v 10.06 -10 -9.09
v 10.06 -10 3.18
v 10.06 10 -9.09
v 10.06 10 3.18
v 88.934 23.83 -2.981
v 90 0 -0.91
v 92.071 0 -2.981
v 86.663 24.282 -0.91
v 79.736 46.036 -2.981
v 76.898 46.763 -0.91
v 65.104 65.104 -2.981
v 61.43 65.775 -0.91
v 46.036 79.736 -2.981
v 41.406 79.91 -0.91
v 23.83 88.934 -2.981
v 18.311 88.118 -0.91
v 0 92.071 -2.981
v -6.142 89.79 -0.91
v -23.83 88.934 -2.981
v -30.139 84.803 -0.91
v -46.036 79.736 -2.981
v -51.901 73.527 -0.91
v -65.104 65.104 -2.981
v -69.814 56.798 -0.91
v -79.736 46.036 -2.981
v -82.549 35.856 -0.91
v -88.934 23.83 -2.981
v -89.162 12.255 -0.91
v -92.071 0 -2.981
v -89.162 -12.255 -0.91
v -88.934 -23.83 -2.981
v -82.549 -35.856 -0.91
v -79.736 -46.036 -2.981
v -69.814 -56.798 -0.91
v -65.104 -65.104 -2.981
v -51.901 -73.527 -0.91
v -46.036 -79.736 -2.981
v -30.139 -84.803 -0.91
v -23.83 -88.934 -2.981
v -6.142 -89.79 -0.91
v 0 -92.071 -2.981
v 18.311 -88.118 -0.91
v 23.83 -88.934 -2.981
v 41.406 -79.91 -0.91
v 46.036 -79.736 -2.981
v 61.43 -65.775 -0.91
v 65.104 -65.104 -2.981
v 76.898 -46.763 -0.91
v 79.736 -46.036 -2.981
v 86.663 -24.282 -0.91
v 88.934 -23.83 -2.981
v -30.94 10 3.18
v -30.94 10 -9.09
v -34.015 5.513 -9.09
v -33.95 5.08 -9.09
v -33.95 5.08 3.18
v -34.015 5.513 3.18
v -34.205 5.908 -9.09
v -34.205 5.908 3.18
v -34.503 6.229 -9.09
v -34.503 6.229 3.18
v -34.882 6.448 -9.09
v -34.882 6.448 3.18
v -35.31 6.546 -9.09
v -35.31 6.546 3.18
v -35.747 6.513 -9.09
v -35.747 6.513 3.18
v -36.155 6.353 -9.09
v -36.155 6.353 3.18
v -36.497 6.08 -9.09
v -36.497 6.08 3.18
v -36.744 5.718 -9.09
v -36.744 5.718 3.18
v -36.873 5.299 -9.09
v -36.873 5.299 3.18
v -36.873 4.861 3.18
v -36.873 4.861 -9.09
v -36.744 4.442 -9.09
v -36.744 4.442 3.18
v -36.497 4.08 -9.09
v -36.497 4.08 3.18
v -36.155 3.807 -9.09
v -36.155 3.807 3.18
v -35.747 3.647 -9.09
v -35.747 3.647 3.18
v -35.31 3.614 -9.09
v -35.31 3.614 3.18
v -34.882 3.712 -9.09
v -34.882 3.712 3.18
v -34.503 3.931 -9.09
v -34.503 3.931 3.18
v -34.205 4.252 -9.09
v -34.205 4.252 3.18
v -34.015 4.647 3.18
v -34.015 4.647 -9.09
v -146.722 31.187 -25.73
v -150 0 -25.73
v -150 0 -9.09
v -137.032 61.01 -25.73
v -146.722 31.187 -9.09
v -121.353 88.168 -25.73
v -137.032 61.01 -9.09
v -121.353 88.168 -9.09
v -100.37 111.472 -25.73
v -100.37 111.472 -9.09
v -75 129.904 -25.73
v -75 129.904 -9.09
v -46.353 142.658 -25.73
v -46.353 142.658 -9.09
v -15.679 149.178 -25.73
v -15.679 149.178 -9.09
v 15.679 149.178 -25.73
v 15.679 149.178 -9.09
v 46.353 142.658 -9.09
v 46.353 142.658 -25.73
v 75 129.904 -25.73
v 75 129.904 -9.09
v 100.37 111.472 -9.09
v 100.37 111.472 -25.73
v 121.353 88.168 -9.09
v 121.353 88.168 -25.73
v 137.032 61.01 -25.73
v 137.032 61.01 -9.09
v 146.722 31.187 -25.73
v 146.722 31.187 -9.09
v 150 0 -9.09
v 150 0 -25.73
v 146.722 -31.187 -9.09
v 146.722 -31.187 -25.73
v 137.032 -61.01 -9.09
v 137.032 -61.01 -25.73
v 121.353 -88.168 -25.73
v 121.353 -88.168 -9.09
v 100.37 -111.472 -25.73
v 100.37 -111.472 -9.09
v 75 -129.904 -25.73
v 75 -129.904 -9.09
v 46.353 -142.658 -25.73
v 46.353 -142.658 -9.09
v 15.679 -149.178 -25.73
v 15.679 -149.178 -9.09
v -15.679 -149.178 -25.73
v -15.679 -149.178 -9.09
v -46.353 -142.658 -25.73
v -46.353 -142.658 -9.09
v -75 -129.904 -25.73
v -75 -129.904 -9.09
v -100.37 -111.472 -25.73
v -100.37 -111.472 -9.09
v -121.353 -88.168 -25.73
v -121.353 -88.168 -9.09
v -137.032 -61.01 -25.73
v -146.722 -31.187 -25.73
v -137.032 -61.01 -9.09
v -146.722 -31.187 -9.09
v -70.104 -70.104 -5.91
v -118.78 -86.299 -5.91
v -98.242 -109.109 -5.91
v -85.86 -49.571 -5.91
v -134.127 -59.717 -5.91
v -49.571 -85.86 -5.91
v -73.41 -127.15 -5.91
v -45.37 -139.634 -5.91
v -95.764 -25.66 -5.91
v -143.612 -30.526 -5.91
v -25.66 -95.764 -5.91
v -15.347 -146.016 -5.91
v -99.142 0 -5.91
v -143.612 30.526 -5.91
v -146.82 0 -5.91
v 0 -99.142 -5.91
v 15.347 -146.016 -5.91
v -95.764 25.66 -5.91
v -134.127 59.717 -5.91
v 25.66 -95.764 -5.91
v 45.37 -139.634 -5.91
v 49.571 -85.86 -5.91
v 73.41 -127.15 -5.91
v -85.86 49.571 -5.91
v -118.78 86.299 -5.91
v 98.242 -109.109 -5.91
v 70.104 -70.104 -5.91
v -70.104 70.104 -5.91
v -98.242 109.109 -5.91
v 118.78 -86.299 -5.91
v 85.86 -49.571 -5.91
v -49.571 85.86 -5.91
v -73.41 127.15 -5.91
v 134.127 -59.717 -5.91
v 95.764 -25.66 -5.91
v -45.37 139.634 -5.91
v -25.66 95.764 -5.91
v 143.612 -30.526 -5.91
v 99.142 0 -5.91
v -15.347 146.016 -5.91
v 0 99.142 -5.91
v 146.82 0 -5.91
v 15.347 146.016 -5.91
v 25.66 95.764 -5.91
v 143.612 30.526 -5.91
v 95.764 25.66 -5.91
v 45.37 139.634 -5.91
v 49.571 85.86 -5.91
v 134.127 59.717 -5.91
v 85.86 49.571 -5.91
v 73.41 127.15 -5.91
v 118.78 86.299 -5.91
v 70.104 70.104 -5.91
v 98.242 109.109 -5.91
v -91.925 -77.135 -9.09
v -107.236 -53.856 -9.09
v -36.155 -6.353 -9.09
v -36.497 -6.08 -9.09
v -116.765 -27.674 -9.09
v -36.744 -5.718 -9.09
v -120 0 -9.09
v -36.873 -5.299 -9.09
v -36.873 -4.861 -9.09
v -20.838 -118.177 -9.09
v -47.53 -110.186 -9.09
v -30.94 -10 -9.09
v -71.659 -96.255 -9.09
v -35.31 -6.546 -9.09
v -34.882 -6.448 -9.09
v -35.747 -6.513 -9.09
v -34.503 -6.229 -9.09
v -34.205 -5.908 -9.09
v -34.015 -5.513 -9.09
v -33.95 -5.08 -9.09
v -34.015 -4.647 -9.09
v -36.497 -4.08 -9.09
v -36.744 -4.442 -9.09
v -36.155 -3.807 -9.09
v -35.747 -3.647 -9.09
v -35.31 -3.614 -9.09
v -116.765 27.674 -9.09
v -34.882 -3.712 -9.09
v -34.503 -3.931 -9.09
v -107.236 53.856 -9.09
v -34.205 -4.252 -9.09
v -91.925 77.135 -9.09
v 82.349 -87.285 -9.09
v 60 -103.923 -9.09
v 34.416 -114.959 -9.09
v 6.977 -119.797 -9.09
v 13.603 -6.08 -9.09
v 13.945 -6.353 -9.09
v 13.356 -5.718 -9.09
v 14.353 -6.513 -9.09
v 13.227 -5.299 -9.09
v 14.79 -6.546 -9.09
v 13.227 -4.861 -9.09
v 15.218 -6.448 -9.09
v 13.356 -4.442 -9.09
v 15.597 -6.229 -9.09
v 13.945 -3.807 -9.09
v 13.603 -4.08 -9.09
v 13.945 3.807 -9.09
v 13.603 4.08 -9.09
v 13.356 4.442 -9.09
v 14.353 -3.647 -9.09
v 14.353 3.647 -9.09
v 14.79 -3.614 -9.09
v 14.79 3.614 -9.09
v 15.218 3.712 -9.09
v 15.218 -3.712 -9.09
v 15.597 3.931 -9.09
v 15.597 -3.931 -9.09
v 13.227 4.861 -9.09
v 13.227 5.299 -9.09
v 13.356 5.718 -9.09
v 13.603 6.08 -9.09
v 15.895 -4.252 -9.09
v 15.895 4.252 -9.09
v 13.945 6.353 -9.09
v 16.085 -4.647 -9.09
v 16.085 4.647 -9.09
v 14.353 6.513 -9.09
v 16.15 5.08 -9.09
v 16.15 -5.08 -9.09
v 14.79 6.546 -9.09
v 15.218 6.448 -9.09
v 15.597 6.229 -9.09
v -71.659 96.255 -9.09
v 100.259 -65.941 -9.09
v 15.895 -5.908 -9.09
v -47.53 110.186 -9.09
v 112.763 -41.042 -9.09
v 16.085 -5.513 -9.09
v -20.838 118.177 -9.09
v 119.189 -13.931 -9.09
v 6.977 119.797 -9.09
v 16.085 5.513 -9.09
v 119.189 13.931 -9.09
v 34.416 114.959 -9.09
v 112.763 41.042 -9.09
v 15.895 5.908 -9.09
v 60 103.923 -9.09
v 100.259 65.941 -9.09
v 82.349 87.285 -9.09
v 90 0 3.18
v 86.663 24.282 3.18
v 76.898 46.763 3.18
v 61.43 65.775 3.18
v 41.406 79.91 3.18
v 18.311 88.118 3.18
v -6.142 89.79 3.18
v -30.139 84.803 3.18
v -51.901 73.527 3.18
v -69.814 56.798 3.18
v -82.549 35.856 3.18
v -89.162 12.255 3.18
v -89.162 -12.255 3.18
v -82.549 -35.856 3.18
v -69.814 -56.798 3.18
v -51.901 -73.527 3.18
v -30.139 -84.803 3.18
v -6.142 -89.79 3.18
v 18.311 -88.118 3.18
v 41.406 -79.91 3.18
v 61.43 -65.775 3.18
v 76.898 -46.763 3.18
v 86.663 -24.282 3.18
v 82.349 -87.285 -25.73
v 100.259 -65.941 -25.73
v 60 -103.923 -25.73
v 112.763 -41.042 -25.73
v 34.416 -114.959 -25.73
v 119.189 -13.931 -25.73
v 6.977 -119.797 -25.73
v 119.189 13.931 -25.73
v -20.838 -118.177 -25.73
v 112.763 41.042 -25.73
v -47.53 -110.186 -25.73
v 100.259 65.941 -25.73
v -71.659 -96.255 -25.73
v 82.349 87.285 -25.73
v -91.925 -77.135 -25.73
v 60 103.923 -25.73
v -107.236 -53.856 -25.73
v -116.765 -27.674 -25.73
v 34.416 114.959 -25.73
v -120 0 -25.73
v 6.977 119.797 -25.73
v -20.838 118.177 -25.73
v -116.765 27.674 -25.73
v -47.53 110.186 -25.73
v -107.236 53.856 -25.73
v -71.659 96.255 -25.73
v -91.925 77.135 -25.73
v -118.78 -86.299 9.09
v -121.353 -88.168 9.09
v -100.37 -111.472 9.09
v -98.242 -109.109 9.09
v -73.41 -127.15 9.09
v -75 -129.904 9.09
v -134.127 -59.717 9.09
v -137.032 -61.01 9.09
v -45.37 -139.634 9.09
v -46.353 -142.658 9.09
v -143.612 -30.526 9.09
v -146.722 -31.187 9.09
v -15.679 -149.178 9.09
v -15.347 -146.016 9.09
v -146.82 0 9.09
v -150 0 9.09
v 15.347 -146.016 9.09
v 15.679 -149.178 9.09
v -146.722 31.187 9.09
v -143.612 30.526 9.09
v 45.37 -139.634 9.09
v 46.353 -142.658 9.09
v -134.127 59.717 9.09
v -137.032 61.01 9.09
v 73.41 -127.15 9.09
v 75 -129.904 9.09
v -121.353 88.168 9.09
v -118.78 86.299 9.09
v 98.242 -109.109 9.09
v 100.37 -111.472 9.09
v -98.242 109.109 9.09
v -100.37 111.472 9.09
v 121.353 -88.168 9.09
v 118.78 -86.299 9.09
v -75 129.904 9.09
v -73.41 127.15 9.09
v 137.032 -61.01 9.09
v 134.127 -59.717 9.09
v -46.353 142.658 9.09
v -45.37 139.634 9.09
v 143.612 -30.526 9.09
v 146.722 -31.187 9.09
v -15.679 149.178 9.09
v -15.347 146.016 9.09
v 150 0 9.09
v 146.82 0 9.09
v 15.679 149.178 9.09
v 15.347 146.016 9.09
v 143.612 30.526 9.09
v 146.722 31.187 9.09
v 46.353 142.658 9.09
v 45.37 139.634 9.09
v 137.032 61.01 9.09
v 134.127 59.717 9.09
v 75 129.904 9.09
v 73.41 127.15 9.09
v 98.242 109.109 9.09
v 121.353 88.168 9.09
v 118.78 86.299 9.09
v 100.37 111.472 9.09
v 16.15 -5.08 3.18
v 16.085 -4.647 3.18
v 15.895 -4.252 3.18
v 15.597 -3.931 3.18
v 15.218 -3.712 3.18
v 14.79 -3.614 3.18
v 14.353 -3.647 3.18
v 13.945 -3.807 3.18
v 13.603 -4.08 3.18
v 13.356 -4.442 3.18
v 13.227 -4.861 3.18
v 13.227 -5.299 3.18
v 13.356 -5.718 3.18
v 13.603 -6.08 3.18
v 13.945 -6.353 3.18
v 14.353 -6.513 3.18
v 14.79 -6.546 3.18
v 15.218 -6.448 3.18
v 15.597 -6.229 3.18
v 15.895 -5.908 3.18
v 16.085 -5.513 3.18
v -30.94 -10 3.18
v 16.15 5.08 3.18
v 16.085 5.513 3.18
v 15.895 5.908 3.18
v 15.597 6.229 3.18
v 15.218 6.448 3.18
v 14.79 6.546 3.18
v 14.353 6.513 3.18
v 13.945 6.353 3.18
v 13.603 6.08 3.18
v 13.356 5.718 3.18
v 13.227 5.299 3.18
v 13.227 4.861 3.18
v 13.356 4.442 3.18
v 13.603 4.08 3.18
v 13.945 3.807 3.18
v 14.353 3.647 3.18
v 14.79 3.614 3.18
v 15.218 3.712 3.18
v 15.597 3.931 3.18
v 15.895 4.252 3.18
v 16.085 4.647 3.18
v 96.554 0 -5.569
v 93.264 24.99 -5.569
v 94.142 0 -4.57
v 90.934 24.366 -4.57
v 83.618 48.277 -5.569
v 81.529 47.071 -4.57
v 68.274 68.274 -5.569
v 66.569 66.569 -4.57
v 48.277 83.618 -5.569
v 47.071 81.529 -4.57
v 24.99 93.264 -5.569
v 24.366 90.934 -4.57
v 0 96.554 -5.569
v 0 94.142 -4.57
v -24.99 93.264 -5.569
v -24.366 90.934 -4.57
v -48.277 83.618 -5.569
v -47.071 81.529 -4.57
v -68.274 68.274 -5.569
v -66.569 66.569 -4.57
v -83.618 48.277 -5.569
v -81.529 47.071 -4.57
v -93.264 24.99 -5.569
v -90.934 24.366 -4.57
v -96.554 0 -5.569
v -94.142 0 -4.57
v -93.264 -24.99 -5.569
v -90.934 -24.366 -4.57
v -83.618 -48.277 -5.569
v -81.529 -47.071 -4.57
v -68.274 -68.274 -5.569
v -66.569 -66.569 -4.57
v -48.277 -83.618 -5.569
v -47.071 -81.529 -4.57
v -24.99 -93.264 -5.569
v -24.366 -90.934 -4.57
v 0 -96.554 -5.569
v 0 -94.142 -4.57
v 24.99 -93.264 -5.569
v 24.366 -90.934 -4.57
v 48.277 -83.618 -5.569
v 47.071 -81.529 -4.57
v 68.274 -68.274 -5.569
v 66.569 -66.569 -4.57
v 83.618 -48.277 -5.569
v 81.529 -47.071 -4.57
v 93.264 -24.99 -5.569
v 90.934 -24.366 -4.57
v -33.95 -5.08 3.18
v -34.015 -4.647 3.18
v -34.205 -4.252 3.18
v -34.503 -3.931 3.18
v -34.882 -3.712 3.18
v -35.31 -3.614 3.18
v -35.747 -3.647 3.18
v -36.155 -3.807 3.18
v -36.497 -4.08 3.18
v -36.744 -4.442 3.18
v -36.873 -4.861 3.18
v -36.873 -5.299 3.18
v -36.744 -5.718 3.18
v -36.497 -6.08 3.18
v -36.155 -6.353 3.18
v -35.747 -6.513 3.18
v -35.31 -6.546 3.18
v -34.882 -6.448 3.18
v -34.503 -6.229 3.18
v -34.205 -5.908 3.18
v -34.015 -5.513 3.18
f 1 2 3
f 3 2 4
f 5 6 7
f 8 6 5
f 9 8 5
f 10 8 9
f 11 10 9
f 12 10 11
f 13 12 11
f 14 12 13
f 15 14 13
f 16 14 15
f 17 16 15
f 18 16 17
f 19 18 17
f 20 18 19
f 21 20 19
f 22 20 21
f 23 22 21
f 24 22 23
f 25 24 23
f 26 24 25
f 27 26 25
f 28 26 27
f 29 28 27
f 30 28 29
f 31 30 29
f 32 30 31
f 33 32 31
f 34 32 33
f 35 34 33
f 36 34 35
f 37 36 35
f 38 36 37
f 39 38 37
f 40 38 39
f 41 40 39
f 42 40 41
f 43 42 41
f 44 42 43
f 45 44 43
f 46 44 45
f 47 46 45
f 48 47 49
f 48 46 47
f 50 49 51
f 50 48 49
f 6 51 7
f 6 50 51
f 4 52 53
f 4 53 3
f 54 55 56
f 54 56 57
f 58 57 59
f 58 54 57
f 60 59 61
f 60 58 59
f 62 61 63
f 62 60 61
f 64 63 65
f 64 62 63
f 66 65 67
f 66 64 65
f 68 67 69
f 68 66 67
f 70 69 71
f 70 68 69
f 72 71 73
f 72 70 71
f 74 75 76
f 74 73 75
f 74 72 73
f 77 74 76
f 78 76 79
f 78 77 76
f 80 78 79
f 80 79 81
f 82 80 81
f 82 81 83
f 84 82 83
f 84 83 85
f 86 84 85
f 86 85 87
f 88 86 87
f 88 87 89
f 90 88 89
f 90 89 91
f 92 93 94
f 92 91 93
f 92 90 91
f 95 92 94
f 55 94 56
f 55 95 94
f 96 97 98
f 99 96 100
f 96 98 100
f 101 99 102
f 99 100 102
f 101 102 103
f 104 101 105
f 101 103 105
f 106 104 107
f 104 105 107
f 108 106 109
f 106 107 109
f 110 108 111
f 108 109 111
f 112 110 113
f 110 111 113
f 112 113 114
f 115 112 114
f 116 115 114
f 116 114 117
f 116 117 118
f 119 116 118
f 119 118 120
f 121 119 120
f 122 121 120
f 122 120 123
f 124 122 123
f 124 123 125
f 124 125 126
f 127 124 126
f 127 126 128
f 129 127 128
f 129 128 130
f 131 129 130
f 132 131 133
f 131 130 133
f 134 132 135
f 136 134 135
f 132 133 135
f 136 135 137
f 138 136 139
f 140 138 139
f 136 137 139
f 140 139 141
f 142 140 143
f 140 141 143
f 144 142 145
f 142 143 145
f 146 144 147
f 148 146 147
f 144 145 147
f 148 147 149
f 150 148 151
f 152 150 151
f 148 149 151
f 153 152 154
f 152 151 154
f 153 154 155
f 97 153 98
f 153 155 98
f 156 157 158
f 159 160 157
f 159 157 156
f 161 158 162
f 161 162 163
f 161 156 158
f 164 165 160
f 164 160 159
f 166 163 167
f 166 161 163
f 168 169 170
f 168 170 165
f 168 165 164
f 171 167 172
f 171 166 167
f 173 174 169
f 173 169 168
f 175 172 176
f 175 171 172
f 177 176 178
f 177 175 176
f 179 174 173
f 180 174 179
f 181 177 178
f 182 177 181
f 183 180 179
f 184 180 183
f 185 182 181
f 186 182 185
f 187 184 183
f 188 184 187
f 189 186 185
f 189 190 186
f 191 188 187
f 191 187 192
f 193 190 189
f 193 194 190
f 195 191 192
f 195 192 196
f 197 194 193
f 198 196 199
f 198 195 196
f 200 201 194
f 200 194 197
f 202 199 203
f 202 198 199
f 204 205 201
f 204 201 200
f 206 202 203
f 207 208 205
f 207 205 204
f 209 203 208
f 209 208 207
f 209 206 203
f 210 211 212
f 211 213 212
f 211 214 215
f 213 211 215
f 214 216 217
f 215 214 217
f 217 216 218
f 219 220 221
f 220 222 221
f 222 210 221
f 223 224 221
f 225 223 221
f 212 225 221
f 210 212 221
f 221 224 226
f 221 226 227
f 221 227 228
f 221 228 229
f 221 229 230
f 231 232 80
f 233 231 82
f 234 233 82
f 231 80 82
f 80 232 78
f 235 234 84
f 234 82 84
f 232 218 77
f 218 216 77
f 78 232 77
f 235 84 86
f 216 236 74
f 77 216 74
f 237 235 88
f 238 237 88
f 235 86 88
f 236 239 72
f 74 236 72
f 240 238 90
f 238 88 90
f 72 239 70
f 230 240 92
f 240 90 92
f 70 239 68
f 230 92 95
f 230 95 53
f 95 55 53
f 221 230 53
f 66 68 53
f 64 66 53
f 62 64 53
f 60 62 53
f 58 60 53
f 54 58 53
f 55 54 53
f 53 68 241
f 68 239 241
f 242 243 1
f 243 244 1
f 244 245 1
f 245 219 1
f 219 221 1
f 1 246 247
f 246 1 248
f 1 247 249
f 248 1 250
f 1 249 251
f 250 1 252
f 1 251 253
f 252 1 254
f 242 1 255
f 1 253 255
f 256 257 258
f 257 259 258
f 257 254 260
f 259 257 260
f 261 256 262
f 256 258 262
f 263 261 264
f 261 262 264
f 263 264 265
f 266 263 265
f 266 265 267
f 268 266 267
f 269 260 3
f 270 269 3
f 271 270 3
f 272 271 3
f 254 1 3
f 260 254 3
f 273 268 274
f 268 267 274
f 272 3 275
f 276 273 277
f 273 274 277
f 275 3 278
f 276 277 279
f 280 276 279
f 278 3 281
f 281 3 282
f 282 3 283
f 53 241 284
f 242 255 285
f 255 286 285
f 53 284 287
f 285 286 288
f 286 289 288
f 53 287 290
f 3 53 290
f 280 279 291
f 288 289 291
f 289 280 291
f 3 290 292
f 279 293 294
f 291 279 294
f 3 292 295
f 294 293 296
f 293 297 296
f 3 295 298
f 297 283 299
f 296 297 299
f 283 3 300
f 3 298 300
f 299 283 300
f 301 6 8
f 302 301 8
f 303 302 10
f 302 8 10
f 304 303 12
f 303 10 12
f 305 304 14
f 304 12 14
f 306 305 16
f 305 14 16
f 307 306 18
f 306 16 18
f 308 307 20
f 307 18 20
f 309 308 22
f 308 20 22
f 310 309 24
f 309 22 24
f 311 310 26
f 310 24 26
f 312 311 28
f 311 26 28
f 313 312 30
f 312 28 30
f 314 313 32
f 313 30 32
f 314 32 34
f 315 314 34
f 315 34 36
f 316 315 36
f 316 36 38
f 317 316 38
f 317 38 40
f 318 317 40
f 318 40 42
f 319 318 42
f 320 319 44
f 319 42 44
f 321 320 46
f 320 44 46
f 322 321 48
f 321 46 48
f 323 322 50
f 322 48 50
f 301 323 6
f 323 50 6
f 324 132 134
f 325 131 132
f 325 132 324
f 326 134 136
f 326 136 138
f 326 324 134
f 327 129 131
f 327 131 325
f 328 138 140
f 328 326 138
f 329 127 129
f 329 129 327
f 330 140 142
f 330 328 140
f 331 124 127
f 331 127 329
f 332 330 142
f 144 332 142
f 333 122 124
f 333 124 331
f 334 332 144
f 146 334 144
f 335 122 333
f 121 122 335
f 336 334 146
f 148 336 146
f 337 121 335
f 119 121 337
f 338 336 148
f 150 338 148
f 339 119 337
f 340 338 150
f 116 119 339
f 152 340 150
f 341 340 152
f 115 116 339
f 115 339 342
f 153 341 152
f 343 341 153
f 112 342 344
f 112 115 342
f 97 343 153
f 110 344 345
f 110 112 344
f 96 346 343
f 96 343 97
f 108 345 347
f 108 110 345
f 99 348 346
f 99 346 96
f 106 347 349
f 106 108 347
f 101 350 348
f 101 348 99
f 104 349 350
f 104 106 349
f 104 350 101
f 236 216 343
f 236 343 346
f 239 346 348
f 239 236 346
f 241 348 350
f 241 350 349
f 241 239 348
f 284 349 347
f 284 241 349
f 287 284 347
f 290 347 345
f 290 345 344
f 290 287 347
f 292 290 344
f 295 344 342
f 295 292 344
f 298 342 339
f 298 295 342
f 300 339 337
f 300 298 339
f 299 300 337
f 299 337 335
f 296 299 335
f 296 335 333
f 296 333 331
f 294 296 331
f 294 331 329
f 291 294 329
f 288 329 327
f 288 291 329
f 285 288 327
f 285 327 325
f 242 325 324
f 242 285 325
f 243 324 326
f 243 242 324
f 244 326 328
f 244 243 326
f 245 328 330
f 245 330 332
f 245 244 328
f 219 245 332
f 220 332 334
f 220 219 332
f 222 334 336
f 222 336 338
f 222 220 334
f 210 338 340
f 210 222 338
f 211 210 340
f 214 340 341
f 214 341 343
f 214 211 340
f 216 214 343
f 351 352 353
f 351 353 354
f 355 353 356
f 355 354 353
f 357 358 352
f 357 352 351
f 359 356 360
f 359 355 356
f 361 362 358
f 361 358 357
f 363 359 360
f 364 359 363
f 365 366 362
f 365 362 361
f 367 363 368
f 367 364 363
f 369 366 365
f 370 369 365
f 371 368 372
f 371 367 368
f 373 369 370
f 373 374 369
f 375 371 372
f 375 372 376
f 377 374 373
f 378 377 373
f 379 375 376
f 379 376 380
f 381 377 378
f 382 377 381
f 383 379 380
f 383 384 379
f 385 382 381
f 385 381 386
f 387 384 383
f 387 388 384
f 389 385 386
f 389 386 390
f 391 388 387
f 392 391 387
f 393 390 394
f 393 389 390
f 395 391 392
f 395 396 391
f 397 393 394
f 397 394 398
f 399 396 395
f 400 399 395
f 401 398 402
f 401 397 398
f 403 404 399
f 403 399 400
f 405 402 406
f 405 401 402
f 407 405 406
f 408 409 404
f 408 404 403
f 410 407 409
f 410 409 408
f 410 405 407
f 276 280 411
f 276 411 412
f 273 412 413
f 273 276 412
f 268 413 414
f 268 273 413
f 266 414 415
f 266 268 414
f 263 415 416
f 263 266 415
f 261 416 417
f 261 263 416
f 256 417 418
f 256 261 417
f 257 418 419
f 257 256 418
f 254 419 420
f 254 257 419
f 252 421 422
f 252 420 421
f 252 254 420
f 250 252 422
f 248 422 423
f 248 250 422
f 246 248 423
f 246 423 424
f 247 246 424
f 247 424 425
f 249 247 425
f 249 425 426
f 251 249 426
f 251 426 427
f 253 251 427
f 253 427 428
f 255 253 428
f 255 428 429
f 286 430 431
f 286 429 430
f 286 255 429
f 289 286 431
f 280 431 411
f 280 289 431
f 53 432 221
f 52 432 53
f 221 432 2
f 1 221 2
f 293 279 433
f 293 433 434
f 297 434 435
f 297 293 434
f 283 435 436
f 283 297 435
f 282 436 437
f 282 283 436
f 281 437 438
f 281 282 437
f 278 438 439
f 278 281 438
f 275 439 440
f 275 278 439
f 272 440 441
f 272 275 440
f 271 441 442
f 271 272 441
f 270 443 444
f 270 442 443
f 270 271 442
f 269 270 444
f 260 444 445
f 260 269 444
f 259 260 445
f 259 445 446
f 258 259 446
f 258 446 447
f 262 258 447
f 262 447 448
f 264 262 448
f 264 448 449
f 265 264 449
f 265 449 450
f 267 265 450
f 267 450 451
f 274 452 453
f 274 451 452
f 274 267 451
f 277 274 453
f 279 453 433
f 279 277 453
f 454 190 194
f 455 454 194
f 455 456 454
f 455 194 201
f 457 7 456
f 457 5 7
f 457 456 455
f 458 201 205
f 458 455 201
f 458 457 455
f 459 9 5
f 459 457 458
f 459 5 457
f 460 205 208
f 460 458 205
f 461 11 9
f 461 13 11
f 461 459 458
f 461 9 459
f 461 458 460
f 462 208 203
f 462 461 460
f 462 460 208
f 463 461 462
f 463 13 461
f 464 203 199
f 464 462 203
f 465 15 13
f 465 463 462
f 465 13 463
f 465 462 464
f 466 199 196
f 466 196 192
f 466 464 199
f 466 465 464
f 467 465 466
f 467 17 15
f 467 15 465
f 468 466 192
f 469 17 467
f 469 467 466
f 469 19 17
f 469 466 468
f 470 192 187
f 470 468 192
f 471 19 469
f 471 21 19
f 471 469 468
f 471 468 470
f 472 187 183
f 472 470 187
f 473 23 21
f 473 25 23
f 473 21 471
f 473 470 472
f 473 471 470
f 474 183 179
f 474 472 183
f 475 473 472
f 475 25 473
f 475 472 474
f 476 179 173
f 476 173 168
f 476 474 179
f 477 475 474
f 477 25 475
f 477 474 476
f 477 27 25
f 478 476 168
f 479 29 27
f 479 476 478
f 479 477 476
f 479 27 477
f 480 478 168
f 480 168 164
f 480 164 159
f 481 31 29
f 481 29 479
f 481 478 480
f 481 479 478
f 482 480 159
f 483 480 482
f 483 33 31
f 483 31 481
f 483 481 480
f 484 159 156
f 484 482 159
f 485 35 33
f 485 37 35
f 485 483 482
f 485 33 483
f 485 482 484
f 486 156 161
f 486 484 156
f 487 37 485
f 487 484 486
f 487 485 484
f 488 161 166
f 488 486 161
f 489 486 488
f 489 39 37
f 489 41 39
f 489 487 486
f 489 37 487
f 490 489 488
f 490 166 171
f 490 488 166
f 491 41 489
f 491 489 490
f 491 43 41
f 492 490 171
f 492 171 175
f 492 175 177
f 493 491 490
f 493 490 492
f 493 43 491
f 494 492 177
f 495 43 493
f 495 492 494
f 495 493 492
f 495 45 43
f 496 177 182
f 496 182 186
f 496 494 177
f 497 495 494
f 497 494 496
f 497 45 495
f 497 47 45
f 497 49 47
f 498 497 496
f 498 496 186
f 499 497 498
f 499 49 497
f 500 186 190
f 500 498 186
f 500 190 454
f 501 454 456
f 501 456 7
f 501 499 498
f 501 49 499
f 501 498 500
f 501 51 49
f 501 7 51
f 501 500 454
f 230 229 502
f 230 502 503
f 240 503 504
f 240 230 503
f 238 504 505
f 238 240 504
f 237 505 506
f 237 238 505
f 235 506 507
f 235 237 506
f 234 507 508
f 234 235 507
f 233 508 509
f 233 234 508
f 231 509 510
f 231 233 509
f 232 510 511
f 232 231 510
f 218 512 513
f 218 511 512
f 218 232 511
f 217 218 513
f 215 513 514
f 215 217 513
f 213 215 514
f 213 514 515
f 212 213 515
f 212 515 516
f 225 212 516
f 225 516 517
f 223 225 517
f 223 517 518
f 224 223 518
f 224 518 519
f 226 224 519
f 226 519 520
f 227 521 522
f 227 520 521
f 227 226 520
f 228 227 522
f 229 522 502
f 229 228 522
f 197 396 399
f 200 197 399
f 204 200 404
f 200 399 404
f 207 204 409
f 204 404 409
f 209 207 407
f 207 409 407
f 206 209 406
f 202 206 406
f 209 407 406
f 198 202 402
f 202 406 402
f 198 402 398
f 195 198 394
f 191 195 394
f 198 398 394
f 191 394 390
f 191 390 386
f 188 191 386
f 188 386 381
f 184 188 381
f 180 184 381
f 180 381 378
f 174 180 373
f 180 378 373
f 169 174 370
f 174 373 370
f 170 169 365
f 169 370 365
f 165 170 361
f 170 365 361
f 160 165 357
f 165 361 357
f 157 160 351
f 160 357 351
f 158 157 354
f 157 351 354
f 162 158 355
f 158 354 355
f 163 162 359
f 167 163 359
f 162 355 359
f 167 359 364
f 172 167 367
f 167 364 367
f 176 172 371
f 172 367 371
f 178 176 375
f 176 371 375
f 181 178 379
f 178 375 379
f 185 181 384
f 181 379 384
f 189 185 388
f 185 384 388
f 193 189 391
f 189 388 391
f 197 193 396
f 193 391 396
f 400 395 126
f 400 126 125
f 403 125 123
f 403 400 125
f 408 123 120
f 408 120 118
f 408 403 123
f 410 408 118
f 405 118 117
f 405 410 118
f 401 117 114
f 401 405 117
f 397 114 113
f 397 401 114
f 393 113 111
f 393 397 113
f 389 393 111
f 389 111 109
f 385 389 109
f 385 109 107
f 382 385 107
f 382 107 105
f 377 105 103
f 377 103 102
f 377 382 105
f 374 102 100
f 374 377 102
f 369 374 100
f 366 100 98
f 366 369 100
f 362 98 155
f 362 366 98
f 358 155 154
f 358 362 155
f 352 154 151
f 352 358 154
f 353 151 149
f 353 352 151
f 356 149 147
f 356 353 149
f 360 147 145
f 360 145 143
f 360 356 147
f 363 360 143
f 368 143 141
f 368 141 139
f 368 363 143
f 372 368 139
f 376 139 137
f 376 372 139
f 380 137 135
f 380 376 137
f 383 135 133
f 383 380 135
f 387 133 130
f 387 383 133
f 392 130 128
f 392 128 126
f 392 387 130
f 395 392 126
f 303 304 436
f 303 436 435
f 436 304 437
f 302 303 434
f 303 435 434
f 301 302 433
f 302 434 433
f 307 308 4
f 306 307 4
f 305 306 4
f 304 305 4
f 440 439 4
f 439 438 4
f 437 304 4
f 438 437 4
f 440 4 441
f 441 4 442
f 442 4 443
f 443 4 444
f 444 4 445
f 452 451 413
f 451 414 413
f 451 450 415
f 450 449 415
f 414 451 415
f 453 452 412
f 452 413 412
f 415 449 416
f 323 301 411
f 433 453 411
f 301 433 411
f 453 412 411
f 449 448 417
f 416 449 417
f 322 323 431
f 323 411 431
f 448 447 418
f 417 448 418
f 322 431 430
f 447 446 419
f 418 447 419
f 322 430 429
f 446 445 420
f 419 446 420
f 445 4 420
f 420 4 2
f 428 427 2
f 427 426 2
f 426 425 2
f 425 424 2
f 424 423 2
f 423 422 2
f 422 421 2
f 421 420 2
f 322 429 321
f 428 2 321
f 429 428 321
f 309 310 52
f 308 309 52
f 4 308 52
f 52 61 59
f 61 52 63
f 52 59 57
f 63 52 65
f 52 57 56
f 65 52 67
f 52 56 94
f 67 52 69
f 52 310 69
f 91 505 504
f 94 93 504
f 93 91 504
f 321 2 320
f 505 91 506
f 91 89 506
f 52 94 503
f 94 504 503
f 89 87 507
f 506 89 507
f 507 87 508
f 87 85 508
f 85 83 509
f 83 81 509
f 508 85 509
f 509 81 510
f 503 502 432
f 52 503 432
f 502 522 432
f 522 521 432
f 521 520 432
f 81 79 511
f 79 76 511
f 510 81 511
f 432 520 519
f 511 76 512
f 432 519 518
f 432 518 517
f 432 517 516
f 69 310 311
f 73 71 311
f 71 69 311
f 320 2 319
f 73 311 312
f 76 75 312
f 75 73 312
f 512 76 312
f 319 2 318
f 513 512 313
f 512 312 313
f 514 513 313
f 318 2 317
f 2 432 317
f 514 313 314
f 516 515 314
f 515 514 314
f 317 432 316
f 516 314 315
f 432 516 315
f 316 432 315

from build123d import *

# Parameters (mm, degrees)
SKETCH1_R               = 150
BOSS_EXTRUDE1_DEPTH     = 9.09
SKETCH2_R               = 146.82
CUT_EXTRUDE1_DEPTH      = 15
SKETCH5_R               = 90
BOSS_EXTRUDE2_DEPTH     = 15
CHAMFER1_SIZE           = 5
FILLET6_R               = 10
SKETCH6_R               = 1.55
CUT_EXTRUDE2_DEPTH      = 5
SKETCH7_R               = 16
CUT_EXTRUDE3_DEPTH      = 4.8
BOSS_EXTRUDE3_START     = 4.8
BOSS_EXTRUDE3_DEPTH     = 4.8
CIRPATTERN1_COUNT       = 30
SKETCH17_W              = 2.73
SKETCH17_H              = 90
SKETCH23_W              = 41
SKETCH23_H              = 20
CUT_EXTRUDE6_DEPTH      = 213.486594636
CUT_EXTRUDE7_DEPTH      = 213.486594636
CUT_EXTRUDE7_DEPTH_BACK = 213.486594636
SKETCH24_R              = 1.47
SKETCH26_R              = 150
SKETCH26_R_2            = 120
BOSS_EXTRUDE4_DEPTH     = 16.64


with BuildPart() as part:
    # Sketch1 → Boss-Extrude1 (new, symmetric)
    with BuildSketch(Plane.XY):
        Circle(SKETCH1_R)
    extrude(amount=BOSS_EXTRUDE1_DEPTH, both=True)

    # Sketch2 → Cut-Extrude1 (cut)
    with BuildSketch(Plane.XY.offset(9.09)):
        Circle(SKETCH2_R)
    extrude(amount=-CUT_EXTRUDE1_DEPTH, mode=Mode.SUBTRACT)

    # Sketch5 → Boss-Extrude2 (add)
    with BuildSketch(Plane.XY.offset(-5.91)):
        Circle(SKETCH5_R)
    extrude(amount=BOSS_EXTRUDE2_DEPTH)

    # Chamfer1
    chamfer1_edges = [part.edges().sort_by_distance(p)[0] for p in [
        (-90, 0, -5.91),
    ]]
    chamfer(chamfer1_edges, length=CHAMFER1_SIZE)

    # Fillet6
    fillet6_edges = [part.edges().sort_by_distance(p)[0] for p in [
        (-95, 0, -5.91),
    ]]
    fillet(fillet6_edges, radius=FILLET6_R)

    # Sketch6 → Cut-Extrude2 (cut)
    with BuildSketch(Plane.XY.offset(9.09)):
        with Locations((64.65, 0)):
            Circle(SKETCH6_R)
        with Locations((-68.33, 0)):
            Circle(SKETCH6_R)
        with Locations((-54.47, 24.14)):
            Circle(SKETCH6_R)
        with Locations((-54.47, -24.14)):
            Circle(SKETCH6_R)
        with Locations((50.79, -24.14)):
            Circle(SKETCH6_R)
        with Locations((50.79, 24.14)):
            Circle(SKETCH6_R)
    extrude(amount=-CUT_EXTRUDE2_DEPTH, mode=Mode.SUBTRACT)

    # Sketch7 → Cut-Extrude3 (cut)
    with BuildSketch(Plane.XY.offset(9.09)):
        Circle(SKETCH7_R)
    extrude(amount=-CUT_EXTRUDE3_DEPTH, mode=Mode.SUBTRACT)

    # Sketch8 → Boss-Extrude3 (add)
    with BuildSketch(Plane.XY.offset(4.29).offset(BOSS_EXTRUDE3_START)):
        with BuildLine():
            ThreePointArc((1.300521762, 15.947057507), (0.787845605, 15.007972717), (0.45011023, 13.992762443))
            ThreePointArc((0.45011023, 13.992762443), (0, 14), (-0.45011023, 13.992762443))
            ThreePointArc((-0.45011023, 13.992762443), (-0.787845605, 15.007972717), (-1.300521762, 15.947057507))
            ThreePointArc((-1.300521762, 15.947057507), (0, 16), (1.300521762, 15.947057507))
        make_face()
    boss_extrude3 = extrude(amount=-BOSS_EXTRUDE3_DEPTH)

    # CirPattern1: Boss-Extrude3 ×30 about axis
    cirpattern1_axis = Axis((0, 0, 0), (0, 0, 1))
    for i in range(1, CIRPATTERN1_COUNT):
        add(boss_extrude3.rotate(cirpattern1_axis, i * 360 / CIRPATTERN1_COUNT))

    # Sketch17 → Cut-Revolve4 (revolve, cut)
    with BuildSketch(Plane(origin=(0, 0, 0), x_dir=(0, 0, -1), z_dir=(1, 0, 0))):
        with Locations((-4.545, 45)):
            Rectangle(SKETCH17_W, SKETCH17_H)
    revolve(axis=Axis((0, 0, -0.91), (0, 0, 1)), mode=Mode.SUBTRACT)


with BuildPart() as cut_revolve4_piece_1:
    # of the separate pieces the step leaves, piece 1, a body of its own (cut_revolve4_pieces)
    add(part.part.solids().sort_by_distance((99.142135624, 0, -5.91))[0])

    # Sketch23 → Cut-Extrude6 (cut, through all)
    with BuildSketch(Plane.XY.offset(3.18)):
        with Locations((-10.44, 0)):
            Rectangle(SKETCH23_W, SKETCH23_H)
    extrude(amount=-CUT_EXTRUDE6_DEPTH, mode=Mode.SUBTRACT)

    # Sketch24 → Cut-Extrude7 (cut, two sides: drawn at the far end of the back side and taken through both)
    with BuildSketch(Plane.XY.offset(3.18).offset(-CUT_EXTRUDE7_DEPTH_BACK)):
        with Locations((-35.419501393, -5.08)):
            Circle(SKETCH24_R)
        with Locations((14.680498607, -5.08)):
            Circle(SKETCH24_R)
        with Locations((-35.419501393, 5.08)):
            Circle(SKETCH24_R)
        with Locations((14.680498607, 5.08)):
            Circle(SKETCH24_R)
    extrude(amount=CUT_EXTRUDE7_DEPTH + CUT_EXTRUDE7_DEPTH_BACK, mode=Mode.SUBTRACT)

    # Sketch26 → Boss-Extrude4 (add)
    with BuildSketch(Plane(origin=(0, 0, -9.09), x_dir=(-1, 0, 0), z_dir=(0, 0, -1))):
        Circle(SKETCH26_R)
        Circle(SKETCH26_R_2, mode=Mode.SUBTRACT)
    extrude(amount=BOSS_EXTRUDE4_DEPTH)


with BuildPart() as cut_revolve4_piece_2:
    # of the separate pieces the step leaves, piece 2, a body of its own (cut_revolve4_pieces)
    add(part.part.solids().sort_by_distance((90, 0, 5.91))[0])


solid = cut_revolve4_piece_1.part
